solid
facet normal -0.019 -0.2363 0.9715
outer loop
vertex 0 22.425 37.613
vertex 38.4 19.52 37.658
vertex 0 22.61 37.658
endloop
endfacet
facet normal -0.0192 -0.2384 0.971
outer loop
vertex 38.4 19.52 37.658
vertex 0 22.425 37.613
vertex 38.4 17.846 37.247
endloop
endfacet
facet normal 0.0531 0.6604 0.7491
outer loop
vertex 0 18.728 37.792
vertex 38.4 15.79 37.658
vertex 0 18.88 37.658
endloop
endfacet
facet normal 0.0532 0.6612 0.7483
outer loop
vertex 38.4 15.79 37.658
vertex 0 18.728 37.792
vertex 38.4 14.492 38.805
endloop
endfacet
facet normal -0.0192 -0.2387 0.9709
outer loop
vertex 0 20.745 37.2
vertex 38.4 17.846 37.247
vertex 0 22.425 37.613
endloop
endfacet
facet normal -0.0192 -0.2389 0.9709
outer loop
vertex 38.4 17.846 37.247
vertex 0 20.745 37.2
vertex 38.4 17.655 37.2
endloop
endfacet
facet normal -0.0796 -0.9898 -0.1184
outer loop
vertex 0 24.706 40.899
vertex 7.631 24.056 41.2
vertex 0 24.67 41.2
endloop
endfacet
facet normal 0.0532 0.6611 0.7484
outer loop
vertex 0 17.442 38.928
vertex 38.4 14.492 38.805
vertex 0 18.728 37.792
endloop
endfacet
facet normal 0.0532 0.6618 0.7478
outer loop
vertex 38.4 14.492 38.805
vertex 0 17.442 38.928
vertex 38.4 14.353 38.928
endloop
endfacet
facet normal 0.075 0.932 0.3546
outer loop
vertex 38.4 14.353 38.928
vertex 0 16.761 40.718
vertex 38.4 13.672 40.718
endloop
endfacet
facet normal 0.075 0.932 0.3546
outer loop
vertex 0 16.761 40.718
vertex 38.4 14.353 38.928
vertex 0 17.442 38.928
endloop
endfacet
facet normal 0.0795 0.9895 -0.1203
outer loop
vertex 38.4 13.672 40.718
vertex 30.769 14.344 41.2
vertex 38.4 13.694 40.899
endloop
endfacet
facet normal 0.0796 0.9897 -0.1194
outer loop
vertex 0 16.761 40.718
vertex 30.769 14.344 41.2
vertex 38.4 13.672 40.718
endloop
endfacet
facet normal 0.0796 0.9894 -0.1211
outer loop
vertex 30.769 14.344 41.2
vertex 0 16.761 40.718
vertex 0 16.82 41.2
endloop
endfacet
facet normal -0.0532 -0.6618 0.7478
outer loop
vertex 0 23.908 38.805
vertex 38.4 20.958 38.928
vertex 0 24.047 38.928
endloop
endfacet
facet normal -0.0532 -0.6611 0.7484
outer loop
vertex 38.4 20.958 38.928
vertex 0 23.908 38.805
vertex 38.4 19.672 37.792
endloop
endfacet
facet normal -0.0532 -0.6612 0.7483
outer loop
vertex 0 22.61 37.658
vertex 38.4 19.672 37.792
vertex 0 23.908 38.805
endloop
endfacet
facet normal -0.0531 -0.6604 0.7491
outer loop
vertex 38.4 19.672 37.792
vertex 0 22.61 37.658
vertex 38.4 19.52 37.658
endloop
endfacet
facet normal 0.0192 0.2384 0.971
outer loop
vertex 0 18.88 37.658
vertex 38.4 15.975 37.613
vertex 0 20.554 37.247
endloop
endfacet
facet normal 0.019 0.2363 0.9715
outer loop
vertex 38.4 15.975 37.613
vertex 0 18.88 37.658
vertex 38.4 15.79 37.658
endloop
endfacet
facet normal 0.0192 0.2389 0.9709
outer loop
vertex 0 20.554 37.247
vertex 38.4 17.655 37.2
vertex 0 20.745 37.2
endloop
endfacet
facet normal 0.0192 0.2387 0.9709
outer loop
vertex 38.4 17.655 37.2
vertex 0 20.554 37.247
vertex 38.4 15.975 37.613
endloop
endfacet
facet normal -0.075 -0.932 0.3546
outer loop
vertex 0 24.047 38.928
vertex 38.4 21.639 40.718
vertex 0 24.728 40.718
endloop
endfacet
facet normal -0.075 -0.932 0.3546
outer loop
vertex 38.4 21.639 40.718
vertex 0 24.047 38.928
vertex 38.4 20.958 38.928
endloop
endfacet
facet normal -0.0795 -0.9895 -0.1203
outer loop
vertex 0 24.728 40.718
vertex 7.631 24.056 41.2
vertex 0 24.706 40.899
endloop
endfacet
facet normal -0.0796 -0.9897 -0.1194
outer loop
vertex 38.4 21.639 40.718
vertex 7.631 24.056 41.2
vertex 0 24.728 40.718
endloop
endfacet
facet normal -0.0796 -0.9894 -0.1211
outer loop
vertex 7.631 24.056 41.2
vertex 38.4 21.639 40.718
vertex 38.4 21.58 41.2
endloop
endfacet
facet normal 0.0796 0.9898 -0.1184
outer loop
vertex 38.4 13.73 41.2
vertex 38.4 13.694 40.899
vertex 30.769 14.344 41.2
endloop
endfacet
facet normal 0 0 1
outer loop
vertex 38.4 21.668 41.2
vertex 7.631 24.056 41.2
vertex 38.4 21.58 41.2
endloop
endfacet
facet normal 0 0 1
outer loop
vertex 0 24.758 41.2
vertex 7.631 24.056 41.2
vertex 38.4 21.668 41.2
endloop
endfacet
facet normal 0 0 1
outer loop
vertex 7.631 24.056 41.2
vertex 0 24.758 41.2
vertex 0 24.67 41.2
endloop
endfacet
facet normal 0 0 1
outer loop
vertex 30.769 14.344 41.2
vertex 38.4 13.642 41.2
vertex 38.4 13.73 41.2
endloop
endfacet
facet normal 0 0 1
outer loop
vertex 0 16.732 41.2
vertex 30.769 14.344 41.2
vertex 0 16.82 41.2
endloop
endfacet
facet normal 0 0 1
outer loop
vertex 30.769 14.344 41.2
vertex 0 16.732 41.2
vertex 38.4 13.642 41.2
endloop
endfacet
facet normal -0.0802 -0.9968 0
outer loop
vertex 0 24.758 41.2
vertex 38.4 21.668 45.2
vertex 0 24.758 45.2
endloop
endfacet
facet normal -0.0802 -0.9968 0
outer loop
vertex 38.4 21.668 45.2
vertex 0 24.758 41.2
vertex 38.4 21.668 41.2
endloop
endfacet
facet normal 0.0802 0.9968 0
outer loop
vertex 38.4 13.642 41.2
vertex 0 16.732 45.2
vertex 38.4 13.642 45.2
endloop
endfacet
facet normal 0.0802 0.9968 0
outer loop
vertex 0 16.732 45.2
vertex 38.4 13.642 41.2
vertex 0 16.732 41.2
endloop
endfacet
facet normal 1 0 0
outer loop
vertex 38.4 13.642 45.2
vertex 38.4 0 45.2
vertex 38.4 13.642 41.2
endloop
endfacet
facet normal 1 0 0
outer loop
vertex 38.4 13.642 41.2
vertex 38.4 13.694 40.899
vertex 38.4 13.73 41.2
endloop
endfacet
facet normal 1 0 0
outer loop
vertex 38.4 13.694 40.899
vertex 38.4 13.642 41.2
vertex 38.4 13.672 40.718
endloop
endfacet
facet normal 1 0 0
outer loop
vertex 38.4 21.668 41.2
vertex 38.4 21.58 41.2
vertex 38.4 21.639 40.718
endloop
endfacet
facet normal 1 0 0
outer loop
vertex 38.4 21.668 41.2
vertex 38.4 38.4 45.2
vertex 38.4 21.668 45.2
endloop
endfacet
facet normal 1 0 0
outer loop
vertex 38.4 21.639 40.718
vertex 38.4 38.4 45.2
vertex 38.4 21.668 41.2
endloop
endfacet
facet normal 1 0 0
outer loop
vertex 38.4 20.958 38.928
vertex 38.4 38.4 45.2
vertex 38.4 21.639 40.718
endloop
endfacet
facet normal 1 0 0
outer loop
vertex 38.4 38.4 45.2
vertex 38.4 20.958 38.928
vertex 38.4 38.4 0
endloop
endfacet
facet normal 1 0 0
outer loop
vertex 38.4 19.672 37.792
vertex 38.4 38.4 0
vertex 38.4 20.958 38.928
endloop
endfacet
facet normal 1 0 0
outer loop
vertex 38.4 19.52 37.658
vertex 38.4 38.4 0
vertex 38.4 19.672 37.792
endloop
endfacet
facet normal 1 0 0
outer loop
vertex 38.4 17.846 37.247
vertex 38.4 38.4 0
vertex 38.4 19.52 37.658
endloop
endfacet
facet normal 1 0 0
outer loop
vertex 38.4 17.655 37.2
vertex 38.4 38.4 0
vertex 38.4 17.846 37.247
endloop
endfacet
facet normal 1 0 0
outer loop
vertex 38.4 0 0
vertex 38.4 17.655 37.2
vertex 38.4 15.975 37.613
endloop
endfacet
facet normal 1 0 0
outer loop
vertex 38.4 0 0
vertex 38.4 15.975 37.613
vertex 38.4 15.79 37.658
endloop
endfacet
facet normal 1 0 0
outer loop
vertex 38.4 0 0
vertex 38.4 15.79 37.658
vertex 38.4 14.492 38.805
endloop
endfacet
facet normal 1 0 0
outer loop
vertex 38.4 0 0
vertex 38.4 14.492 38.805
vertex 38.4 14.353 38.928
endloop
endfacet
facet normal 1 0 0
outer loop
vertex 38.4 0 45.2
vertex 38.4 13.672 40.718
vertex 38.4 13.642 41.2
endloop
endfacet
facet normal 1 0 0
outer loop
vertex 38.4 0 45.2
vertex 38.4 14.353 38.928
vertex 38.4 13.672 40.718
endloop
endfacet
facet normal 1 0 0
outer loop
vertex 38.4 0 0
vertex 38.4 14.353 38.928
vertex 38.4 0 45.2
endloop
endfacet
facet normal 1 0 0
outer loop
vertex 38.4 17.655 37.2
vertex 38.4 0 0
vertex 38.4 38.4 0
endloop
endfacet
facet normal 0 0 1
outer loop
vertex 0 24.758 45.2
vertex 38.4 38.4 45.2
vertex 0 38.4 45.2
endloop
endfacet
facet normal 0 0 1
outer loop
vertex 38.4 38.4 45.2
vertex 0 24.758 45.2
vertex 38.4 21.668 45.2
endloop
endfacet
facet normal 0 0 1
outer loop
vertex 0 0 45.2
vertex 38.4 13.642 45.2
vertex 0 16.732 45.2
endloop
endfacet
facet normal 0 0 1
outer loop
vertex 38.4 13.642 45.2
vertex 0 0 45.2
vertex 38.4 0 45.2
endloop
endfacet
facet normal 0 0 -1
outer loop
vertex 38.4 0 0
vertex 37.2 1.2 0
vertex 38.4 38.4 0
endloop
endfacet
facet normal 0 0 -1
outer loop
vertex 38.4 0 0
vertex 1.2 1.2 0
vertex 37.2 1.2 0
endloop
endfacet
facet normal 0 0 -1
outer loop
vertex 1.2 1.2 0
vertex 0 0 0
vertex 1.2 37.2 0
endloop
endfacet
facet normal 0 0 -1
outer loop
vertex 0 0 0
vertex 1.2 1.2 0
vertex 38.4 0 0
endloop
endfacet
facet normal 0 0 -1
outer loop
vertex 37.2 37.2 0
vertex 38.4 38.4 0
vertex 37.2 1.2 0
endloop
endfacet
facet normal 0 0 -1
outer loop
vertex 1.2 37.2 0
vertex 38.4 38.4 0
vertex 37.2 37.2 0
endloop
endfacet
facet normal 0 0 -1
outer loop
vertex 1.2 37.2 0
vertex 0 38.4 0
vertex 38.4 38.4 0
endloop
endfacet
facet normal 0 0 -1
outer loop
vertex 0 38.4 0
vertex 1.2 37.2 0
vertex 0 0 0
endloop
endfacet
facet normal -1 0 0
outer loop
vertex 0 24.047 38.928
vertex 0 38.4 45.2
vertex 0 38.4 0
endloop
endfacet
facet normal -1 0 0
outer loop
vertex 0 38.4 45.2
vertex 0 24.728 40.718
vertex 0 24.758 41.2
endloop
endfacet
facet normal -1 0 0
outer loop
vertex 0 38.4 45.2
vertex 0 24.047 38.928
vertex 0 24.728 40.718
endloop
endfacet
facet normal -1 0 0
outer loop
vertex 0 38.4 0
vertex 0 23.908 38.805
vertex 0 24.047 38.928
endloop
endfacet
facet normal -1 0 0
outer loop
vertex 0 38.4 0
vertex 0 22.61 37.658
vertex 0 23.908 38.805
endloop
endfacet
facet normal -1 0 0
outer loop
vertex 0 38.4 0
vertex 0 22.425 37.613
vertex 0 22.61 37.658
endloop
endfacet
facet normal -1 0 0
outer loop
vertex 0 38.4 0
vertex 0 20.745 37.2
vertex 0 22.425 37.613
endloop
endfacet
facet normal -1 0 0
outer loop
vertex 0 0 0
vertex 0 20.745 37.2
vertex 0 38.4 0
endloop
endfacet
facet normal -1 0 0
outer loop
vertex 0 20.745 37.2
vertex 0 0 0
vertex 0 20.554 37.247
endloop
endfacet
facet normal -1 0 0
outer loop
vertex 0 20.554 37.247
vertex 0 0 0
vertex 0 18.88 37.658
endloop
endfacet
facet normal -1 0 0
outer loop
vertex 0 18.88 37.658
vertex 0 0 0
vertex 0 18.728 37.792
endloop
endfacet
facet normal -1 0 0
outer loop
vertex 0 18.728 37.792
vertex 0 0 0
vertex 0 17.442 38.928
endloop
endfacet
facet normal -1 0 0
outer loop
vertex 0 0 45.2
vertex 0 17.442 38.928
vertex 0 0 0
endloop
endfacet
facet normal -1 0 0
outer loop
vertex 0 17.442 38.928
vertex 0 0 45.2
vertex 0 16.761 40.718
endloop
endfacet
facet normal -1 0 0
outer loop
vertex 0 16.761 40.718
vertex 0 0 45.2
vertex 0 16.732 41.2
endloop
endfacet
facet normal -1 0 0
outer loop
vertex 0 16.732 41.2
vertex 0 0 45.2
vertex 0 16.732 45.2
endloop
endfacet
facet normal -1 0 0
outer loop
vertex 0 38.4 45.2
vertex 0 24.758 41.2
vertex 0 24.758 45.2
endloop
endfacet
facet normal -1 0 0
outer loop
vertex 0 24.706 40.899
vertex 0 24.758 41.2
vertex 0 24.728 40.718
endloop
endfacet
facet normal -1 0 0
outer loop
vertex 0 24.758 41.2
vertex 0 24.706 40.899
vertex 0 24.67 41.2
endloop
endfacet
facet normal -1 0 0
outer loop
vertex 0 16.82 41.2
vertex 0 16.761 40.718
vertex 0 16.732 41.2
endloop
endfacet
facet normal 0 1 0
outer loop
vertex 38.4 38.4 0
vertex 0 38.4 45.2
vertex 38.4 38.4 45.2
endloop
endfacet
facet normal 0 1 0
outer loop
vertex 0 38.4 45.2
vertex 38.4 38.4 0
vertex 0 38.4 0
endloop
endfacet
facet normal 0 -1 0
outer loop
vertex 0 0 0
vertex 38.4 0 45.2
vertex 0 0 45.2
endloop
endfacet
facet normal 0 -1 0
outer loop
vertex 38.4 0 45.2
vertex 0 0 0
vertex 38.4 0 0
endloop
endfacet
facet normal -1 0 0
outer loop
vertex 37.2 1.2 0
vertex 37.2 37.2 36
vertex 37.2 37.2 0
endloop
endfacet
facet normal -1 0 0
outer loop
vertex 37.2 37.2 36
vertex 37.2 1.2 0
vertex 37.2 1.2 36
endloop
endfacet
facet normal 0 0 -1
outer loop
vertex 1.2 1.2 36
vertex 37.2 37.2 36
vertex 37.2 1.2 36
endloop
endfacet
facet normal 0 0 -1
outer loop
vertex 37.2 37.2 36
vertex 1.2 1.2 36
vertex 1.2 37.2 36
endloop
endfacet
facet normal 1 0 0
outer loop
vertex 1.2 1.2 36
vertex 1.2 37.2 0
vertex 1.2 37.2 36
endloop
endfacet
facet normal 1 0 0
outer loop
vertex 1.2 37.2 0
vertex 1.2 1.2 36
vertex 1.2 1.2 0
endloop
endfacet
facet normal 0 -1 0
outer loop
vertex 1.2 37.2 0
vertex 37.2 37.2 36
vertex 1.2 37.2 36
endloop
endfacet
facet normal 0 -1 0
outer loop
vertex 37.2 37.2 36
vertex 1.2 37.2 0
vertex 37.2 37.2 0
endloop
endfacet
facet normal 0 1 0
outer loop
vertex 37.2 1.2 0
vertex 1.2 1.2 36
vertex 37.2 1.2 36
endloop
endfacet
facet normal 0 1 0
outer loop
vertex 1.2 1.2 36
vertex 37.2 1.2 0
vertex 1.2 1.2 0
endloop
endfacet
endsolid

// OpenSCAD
a = 36; // Foot dimension
b = 1.2; // Wall thickness.
c = 8; // Shaft diameter
d = -4.6; // Angle 

// Todo: Cap can be smaller than the full width
// TODO: Make it customizable and upload to thingiverse
// TODO: Rounded/chamfered corners

difference() {
    cube([a + 2*b, a + 2*b, a + b + c], center=false);
    translate([b,b,0]) cube([a, a, a], center=false);
    translate([a/2 + b,a/2 + b,a + b + c/2]) {
        rotate([0,90,d]) cylinder(a + 2*b + 10, c/2,c/2,center=true);
        translate([0,0,c/2]) rotate([0,0,d]) cube([a + 2*b + 10, c, c], center=true);
    }
}
